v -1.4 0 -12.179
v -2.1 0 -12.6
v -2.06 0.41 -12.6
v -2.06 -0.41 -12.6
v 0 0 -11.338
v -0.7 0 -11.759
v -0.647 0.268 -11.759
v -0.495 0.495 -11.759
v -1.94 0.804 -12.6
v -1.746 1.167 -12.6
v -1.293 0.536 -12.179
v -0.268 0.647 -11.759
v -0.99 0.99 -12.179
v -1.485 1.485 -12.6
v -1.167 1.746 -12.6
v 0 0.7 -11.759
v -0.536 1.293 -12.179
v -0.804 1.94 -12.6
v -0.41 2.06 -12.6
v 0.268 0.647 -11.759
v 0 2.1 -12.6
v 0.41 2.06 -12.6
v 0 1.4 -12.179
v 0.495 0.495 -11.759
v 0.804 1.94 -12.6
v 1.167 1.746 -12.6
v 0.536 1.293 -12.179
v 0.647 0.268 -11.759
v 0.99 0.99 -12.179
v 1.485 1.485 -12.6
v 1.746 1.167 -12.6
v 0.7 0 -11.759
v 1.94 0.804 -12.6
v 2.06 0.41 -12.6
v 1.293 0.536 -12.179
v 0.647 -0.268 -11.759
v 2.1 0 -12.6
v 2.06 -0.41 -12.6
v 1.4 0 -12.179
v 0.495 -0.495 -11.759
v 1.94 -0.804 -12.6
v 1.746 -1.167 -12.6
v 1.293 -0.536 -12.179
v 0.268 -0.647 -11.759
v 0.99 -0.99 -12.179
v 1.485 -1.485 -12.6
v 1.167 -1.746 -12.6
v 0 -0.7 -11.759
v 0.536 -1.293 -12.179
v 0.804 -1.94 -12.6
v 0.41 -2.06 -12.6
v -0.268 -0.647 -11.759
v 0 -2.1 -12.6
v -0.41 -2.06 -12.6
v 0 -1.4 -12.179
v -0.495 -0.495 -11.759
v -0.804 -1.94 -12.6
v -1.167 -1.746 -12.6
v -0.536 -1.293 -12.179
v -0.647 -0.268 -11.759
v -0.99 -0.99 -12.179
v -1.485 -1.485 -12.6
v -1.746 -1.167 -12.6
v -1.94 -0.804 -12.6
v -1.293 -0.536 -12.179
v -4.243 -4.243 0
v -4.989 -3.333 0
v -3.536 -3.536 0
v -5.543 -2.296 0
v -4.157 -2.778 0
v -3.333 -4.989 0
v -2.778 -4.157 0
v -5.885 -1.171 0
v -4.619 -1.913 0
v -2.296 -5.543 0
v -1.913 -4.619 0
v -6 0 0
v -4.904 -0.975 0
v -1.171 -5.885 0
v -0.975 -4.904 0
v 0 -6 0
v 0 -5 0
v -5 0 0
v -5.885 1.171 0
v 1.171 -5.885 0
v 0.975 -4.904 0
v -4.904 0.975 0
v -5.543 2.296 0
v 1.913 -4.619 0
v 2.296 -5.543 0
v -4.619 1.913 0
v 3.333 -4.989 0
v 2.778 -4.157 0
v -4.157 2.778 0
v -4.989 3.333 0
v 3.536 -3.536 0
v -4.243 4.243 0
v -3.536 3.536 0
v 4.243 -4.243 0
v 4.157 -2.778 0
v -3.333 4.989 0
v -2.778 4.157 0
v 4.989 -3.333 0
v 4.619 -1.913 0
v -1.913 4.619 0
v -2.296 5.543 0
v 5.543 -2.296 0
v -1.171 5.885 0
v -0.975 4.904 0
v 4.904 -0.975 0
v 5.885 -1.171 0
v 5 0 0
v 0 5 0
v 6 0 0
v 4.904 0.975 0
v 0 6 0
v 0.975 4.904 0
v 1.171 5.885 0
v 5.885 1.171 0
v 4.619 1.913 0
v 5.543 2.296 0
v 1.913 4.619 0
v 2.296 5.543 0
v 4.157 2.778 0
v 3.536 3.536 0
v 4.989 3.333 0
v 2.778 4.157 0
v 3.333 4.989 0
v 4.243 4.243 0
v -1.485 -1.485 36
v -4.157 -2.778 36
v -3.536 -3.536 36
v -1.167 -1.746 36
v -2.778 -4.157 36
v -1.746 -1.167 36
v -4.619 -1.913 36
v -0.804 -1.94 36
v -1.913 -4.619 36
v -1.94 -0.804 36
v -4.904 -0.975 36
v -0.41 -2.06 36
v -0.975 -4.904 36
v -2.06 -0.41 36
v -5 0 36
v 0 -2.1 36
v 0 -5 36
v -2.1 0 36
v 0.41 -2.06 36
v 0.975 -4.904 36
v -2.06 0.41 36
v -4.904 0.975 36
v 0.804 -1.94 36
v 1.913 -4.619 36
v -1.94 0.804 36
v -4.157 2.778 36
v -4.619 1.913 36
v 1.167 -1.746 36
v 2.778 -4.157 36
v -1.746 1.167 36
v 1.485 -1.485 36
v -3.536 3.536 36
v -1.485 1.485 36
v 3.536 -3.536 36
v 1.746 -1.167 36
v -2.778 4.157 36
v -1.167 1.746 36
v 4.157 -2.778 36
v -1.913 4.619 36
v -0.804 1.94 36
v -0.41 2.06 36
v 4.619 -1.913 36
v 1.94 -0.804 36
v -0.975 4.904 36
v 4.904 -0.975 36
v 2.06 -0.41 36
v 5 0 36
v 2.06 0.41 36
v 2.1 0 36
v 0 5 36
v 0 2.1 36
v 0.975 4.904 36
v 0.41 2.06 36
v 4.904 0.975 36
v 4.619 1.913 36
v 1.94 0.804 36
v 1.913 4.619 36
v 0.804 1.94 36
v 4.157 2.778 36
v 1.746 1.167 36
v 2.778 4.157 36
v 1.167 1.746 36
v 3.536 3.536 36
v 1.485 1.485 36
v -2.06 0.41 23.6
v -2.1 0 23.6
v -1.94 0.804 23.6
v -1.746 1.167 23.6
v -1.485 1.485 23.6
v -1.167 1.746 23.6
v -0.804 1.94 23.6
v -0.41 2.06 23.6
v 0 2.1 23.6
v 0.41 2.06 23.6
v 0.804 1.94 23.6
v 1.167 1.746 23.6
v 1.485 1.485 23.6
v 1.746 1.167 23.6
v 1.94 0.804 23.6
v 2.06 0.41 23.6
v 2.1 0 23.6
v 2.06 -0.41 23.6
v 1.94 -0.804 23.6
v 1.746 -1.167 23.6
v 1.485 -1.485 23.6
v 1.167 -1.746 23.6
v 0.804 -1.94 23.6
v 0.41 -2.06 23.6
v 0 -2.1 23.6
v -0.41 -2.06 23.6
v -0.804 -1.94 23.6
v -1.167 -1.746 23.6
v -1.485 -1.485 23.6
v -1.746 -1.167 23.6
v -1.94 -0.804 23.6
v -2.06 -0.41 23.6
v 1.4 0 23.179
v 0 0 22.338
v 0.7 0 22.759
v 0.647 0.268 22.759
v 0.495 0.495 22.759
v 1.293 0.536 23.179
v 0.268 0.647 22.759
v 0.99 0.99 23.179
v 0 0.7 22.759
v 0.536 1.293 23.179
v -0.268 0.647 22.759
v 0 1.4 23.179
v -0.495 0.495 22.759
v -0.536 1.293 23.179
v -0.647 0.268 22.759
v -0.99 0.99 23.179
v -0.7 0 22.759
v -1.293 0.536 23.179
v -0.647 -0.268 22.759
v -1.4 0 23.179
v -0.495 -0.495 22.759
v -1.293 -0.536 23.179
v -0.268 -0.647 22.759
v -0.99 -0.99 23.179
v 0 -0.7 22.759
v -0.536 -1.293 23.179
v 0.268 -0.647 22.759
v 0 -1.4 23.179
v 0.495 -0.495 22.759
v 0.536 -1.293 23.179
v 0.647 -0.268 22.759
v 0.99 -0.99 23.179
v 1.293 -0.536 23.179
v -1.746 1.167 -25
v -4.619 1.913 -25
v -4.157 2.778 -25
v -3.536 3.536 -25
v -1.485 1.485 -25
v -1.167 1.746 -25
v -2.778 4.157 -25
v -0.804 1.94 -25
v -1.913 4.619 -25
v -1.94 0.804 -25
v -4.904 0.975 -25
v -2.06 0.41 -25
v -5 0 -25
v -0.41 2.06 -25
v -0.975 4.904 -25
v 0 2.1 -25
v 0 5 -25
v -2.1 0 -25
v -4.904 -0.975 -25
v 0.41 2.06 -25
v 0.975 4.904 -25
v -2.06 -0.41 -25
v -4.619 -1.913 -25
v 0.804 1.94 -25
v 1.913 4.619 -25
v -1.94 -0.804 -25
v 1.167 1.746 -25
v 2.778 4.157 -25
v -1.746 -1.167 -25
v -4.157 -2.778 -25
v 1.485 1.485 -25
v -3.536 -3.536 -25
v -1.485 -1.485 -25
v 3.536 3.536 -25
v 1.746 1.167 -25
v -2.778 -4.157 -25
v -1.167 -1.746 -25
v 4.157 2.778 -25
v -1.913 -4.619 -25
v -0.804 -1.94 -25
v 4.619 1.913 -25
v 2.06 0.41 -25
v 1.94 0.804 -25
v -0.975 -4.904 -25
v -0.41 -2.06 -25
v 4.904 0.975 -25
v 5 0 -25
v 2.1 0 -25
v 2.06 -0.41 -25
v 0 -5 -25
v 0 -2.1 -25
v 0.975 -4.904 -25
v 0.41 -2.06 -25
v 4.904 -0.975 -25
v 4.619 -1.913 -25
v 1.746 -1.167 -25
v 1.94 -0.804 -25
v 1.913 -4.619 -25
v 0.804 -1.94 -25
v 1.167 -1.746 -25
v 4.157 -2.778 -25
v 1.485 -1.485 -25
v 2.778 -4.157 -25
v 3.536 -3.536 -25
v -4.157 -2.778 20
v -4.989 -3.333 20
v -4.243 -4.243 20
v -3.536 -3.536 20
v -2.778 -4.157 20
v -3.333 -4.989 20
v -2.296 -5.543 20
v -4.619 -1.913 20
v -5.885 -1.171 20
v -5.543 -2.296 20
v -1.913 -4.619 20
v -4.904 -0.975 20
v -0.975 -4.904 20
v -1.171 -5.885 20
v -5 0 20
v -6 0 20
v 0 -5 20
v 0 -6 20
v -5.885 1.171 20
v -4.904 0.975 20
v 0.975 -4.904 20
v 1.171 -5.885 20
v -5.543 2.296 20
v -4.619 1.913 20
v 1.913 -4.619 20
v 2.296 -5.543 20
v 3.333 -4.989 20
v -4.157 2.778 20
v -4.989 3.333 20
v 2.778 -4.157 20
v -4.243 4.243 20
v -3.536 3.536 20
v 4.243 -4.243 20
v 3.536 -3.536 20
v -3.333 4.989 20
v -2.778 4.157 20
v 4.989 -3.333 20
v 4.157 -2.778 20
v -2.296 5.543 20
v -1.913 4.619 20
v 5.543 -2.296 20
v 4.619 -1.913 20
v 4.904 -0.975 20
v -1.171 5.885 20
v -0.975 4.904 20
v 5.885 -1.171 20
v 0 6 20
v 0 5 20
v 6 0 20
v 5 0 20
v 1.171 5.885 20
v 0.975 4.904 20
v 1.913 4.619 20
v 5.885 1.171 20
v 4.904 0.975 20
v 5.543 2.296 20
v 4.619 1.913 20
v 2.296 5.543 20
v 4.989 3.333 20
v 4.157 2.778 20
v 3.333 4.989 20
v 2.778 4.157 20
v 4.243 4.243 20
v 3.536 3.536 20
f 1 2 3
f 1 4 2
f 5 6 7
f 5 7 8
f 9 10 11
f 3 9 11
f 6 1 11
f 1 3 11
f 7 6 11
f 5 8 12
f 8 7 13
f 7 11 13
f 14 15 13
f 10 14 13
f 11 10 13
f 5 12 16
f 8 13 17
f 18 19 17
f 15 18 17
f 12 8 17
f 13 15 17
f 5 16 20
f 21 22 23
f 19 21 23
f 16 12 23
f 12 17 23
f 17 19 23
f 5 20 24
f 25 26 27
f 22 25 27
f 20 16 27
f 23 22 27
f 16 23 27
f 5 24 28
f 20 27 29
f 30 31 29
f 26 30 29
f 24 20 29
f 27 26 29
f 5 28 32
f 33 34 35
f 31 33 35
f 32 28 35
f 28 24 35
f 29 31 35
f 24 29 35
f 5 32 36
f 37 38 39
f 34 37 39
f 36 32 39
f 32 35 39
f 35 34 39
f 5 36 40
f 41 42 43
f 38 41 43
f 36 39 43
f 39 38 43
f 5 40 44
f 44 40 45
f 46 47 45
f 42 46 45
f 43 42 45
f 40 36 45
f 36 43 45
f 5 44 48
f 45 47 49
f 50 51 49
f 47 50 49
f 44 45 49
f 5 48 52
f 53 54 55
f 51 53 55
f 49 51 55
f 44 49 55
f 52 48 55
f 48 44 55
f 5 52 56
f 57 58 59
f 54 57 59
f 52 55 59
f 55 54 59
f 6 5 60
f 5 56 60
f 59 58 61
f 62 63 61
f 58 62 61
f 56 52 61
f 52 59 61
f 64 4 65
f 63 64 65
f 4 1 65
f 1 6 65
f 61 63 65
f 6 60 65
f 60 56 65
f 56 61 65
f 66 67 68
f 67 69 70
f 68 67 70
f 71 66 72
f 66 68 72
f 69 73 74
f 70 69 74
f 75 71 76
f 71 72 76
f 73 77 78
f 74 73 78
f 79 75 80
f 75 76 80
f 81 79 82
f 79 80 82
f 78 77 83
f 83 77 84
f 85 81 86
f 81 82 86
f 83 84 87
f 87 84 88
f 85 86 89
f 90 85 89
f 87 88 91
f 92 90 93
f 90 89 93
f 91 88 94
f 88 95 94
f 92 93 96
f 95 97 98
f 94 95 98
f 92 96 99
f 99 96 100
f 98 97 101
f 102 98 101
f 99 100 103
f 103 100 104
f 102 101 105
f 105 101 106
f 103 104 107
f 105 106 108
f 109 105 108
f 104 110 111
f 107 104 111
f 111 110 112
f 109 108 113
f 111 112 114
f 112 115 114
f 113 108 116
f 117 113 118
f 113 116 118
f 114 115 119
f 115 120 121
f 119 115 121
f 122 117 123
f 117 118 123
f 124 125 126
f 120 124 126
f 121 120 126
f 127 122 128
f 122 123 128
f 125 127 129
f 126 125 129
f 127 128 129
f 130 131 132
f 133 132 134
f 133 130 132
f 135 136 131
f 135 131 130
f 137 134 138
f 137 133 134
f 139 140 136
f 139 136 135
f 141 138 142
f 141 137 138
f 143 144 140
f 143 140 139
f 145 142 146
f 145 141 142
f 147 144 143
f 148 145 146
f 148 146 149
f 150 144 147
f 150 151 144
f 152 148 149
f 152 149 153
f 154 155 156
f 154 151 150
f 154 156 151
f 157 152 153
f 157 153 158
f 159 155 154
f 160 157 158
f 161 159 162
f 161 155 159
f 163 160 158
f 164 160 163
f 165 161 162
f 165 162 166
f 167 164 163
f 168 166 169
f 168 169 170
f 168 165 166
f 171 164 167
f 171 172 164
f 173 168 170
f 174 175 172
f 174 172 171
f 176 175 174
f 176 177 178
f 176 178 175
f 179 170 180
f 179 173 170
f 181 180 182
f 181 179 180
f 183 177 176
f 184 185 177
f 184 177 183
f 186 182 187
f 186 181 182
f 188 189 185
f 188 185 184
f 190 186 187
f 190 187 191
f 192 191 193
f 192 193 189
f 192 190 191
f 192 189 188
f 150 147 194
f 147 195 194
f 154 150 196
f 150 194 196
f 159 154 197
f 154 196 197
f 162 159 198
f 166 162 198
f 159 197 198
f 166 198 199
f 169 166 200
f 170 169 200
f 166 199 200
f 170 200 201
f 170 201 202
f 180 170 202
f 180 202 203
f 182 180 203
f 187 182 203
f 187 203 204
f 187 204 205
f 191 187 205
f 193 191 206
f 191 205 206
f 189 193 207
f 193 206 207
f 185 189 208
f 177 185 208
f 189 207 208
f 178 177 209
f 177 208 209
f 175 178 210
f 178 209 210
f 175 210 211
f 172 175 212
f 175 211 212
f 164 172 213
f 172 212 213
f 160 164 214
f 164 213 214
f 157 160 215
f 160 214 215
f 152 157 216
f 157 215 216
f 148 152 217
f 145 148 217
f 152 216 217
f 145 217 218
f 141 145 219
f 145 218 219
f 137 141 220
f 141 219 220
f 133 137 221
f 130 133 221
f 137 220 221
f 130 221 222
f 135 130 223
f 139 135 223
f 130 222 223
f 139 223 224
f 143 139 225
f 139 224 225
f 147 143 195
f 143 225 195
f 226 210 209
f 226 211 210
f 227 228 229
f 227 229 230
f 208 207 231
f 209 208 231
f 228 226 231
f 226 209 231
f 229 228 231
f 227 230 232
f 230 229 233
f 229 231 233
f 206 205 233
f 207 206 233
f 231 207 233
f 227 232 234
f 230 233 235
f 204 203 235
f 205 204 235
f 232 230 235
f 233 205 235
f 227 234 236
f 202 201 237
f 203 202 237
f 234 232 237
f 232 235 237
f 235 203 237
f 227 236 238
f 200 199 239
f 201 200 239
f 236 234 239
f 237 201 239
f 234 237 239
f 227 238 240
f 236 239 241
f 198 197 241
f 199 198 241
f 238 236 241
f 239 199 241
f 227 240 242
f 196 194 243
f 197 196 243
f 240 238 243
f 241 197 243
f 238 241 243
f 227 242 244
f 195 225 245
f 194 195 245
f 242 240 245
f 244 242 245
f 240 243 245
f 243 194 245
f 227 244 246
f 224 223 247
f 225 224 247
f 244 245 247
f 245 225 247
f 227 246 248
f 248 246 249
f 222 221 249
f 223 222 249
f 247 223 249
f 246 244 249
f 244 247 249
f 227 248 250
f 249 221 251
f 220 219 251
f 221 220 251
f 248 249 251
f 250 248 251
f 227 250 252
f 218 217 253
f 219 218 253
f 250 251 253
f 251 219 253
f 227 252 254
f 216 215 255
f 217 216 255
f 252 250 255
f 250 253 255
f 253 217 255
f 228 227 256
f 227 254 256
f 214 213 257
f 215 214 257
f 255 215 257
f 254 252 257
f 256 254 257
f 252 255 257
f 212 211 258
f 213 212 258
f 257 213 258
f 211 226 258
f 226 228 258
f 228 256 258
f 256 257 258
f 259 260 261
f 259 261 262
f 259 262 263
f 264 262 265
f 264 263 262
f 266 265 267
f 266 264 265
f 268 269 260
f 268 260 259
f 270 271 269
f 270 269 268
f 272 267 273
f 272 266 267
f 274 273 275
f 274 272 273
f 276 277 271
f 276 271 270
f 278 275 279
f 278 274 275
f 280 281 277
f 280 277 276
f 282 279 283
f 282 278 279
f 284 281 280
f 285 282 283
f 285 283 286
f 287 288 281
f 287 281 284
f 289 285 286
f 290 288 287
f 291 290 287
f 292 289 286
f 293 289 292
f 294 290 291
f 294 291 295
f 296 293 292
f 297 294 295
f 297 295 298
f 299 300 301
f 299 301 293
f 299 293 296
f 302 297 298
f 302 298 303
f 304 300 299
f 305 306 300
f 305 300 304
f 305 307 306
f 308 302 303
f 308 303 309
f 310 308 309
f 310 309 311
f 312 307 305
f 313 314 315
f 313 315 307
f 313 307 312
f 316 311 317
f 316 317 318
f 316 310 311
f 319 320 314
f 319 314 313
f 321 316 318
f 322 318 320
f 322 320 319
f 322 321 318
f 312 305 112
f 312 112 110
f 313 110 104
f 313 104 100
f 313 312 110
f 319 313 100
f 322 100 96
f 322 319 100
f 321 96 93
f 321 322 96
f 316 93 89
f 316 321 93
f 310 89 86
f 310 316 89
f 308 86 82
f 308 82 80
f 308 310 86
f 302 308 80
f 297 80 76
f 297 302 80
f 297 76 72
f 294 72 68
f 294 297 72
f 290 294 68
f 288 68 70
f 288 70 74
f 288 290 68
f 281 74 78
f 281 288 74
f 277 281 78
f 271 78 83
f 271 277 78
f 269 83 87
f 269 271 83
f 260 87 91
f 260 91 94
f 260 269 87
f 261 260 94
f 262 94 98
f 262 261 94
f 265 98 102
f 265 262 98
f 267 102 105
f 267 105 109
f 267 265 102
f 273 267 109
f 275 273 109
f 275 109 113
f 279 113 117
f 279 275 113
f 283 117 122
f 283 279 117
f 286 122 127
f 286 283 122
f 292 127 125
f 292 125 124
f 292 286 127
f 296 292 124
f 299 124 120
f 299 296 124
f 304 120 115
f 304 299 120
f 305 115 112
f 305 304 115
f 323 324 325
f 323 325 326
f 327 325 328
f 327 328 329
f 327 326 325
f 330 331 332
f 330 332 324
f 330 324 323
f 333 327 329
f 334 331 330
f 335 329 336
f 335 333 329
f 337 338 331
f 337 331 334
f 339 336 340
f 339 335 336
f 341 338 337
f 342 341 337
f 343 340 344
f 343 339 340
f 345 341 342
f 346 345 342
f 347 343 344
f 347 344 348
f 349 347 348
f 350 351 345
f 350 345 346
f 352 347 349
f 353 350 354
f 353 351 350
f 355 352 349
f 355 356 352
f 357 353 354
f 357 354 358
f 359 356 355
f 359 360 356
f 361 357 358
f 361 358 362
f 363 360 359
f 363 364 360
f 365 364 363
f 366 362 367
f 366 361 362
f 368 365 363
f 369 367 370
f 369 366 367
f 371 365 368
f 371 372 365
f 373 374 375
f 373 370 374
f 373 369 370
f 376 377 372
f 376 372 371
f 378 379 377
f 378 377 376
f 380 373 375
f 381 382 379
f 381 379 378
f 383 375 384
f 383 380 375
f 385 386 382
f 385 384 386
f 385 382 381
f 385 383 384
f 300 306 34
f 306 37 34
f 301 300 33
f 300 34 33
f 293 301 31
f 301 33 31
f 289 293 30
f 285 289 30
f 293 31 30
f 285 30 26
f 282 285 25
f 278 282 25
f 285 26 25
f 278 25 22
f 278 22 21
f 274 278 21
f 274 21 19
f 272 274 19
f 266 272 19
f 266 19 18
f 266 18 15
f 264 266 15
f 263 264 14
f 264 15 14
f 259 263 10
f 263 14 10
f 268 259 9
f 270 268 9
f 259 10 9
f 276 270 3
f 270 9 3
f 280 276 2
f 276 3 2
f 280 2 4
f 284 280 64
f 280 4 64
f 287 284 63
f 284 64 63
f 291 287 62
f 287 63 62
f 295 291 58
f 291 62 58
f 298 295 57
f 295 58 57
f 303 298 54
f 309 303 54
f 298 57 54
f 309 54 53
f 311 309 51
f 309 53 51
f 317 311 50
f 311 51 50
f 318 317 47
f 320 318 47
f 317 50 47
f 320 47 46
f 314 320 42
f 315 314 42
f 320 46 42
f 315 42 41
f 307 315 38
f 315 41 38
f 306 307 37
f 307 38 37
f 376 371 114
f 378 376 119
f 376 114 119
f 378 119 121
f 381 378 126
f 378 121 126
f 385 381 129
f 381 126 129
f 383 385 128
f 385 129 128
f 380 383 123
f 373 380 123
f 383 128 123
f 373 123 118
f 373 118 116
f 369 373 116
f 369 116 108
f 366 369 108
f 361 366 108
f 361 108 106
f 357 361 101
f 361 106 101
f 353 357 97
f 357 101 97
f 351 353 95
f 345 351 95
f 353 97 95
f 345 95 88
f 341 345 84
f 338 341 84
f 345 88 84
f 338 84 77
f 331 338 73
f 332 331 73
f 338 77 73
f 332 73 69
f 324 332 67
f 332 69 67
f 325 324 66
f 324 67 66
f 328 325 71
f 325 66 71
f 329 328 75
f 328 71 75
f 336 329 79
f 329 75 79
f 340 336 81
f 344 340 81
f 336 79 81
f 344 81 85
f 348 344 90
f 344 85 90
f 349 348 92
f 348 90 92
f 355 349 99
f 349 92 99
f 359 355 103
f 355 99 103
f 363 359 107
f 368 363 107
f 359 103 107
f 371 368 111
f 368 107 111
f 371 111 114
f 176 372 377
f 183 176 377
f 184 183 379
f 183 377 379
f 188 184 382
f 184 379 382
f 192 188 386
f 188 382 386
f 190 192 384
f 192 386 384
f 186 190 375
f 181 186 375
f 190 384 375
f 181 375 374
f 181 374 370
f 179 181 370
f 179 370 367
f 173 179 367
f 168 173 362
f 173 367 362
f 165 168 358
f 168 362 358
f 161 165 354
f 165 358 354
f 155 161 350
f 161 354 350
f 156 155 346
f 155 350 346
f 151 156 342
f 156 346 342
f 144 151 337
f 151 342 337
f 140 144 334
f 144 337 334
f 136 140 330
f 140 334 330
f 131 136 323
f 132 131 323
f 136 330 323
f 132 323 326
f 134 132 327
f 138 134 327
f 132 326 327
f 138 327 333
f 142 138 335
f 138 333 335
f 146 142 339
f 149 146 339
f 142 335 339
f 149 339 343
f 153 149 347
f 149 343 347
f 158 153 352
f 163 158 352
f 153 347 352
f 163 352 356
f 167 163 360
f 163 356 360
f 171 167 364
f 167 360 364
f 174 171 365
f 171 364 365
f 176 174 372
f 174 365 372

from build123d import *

# Parameters (mm, degrees)
SKETCH_1_R             = 6
EXTRUDE_1_DEPTH        = 20
SKETCH_2_R             = 5
EXTRUDE_2_DEPTH        = 16
EXTRUDE_START          = 25
SKETCH_3_R             = 5
EXTRUDE_3_DEPTH        = 25
HOLE_WIZARD_M5_1_D     = 4.2
HOLE_WIZARD_M5_1_DEPTH = 12.4
HOLE_WIZARD_M5_1_TIP   = 1.2618073
HOLE_WIZARD_M5_2_D     = 4.2
HOLE_WIZARD_M5_2_DEPTH = 12.4
HOLE_WIZARD_M5_2_TIP   = 1.2618073


with BuildPart() as part:
    # 草图1 → 凸台-拉伸1 (new body)
    with BuildSketch(Plane.XY):
        Circle(SKETCH_1_R)
    extrude(amount=EXTRUDE_1_DEPTH)

    # 草图2 → 凸台-拉伸2 (add)
    with BuildSketch(Plane.XY.offset(20)):
        Circle(SKETCH_2_R)
    extrude(amount=EXTRUDE_2_DEPTH)

    # 草图3 → 凸台-拉伸3 (add)
    with BuildSketch(Plane(origin=(0, 0, 0), x_dir=(-1, 0, 0), z_dir=(0, 0, -1)).offset(EXTRUDE_START)):
        with Locations(Location((0, 0, 0), (0, 0, 180))):
            Circle(SKETCH_3_R)
    extrude(amount=-EXTRUDE_3_DEPTH)

    # M5 螺纹孔1
    with Locations(Plane(origin=(0, 0, -25), x_dir=(-1, 0, 0), z_dir=(0, 0, -1))):
        with Locations((0, 0)):
            Hole(HOLE_WIZARD_M5_1_D / 2, depth=HOLE_WIZARD_M5_1_DEPTH)
            with Locations((0, 0, -(HOLE_WIZARD_M5_1_DEPTH + HOLE_WIZARD_M5_1_TIP / 2))):  # 118° drill point
                Cone(0, HOLE_WIZARD_M5_1_D / 2, HOLE_WIZARD_M5_1_TIP, mode=Mode.SUBTRACT)

    # M5 螺纹孔2
    with Locations(Plane.XY.offset(36)):
        with Locations((0, 0)):
            Hole(HOLE_WIZARD_M5_2_D / 2, depth=HOLE_WIZARD_M5_2_DEPTH)
            with Locations((0, 0, -(HOLE_WIZARD_M5_2_DEPTH + HOLE_WIZARD_M5_2_TIP / 2))):  # 118° drill point
                Cone(0, HOLE_WIZARD_M5_2_D / 2, HOLE_WIZARD_M5_2_TIP, mode=Mode.SUBTRACT)


solid = part.part
